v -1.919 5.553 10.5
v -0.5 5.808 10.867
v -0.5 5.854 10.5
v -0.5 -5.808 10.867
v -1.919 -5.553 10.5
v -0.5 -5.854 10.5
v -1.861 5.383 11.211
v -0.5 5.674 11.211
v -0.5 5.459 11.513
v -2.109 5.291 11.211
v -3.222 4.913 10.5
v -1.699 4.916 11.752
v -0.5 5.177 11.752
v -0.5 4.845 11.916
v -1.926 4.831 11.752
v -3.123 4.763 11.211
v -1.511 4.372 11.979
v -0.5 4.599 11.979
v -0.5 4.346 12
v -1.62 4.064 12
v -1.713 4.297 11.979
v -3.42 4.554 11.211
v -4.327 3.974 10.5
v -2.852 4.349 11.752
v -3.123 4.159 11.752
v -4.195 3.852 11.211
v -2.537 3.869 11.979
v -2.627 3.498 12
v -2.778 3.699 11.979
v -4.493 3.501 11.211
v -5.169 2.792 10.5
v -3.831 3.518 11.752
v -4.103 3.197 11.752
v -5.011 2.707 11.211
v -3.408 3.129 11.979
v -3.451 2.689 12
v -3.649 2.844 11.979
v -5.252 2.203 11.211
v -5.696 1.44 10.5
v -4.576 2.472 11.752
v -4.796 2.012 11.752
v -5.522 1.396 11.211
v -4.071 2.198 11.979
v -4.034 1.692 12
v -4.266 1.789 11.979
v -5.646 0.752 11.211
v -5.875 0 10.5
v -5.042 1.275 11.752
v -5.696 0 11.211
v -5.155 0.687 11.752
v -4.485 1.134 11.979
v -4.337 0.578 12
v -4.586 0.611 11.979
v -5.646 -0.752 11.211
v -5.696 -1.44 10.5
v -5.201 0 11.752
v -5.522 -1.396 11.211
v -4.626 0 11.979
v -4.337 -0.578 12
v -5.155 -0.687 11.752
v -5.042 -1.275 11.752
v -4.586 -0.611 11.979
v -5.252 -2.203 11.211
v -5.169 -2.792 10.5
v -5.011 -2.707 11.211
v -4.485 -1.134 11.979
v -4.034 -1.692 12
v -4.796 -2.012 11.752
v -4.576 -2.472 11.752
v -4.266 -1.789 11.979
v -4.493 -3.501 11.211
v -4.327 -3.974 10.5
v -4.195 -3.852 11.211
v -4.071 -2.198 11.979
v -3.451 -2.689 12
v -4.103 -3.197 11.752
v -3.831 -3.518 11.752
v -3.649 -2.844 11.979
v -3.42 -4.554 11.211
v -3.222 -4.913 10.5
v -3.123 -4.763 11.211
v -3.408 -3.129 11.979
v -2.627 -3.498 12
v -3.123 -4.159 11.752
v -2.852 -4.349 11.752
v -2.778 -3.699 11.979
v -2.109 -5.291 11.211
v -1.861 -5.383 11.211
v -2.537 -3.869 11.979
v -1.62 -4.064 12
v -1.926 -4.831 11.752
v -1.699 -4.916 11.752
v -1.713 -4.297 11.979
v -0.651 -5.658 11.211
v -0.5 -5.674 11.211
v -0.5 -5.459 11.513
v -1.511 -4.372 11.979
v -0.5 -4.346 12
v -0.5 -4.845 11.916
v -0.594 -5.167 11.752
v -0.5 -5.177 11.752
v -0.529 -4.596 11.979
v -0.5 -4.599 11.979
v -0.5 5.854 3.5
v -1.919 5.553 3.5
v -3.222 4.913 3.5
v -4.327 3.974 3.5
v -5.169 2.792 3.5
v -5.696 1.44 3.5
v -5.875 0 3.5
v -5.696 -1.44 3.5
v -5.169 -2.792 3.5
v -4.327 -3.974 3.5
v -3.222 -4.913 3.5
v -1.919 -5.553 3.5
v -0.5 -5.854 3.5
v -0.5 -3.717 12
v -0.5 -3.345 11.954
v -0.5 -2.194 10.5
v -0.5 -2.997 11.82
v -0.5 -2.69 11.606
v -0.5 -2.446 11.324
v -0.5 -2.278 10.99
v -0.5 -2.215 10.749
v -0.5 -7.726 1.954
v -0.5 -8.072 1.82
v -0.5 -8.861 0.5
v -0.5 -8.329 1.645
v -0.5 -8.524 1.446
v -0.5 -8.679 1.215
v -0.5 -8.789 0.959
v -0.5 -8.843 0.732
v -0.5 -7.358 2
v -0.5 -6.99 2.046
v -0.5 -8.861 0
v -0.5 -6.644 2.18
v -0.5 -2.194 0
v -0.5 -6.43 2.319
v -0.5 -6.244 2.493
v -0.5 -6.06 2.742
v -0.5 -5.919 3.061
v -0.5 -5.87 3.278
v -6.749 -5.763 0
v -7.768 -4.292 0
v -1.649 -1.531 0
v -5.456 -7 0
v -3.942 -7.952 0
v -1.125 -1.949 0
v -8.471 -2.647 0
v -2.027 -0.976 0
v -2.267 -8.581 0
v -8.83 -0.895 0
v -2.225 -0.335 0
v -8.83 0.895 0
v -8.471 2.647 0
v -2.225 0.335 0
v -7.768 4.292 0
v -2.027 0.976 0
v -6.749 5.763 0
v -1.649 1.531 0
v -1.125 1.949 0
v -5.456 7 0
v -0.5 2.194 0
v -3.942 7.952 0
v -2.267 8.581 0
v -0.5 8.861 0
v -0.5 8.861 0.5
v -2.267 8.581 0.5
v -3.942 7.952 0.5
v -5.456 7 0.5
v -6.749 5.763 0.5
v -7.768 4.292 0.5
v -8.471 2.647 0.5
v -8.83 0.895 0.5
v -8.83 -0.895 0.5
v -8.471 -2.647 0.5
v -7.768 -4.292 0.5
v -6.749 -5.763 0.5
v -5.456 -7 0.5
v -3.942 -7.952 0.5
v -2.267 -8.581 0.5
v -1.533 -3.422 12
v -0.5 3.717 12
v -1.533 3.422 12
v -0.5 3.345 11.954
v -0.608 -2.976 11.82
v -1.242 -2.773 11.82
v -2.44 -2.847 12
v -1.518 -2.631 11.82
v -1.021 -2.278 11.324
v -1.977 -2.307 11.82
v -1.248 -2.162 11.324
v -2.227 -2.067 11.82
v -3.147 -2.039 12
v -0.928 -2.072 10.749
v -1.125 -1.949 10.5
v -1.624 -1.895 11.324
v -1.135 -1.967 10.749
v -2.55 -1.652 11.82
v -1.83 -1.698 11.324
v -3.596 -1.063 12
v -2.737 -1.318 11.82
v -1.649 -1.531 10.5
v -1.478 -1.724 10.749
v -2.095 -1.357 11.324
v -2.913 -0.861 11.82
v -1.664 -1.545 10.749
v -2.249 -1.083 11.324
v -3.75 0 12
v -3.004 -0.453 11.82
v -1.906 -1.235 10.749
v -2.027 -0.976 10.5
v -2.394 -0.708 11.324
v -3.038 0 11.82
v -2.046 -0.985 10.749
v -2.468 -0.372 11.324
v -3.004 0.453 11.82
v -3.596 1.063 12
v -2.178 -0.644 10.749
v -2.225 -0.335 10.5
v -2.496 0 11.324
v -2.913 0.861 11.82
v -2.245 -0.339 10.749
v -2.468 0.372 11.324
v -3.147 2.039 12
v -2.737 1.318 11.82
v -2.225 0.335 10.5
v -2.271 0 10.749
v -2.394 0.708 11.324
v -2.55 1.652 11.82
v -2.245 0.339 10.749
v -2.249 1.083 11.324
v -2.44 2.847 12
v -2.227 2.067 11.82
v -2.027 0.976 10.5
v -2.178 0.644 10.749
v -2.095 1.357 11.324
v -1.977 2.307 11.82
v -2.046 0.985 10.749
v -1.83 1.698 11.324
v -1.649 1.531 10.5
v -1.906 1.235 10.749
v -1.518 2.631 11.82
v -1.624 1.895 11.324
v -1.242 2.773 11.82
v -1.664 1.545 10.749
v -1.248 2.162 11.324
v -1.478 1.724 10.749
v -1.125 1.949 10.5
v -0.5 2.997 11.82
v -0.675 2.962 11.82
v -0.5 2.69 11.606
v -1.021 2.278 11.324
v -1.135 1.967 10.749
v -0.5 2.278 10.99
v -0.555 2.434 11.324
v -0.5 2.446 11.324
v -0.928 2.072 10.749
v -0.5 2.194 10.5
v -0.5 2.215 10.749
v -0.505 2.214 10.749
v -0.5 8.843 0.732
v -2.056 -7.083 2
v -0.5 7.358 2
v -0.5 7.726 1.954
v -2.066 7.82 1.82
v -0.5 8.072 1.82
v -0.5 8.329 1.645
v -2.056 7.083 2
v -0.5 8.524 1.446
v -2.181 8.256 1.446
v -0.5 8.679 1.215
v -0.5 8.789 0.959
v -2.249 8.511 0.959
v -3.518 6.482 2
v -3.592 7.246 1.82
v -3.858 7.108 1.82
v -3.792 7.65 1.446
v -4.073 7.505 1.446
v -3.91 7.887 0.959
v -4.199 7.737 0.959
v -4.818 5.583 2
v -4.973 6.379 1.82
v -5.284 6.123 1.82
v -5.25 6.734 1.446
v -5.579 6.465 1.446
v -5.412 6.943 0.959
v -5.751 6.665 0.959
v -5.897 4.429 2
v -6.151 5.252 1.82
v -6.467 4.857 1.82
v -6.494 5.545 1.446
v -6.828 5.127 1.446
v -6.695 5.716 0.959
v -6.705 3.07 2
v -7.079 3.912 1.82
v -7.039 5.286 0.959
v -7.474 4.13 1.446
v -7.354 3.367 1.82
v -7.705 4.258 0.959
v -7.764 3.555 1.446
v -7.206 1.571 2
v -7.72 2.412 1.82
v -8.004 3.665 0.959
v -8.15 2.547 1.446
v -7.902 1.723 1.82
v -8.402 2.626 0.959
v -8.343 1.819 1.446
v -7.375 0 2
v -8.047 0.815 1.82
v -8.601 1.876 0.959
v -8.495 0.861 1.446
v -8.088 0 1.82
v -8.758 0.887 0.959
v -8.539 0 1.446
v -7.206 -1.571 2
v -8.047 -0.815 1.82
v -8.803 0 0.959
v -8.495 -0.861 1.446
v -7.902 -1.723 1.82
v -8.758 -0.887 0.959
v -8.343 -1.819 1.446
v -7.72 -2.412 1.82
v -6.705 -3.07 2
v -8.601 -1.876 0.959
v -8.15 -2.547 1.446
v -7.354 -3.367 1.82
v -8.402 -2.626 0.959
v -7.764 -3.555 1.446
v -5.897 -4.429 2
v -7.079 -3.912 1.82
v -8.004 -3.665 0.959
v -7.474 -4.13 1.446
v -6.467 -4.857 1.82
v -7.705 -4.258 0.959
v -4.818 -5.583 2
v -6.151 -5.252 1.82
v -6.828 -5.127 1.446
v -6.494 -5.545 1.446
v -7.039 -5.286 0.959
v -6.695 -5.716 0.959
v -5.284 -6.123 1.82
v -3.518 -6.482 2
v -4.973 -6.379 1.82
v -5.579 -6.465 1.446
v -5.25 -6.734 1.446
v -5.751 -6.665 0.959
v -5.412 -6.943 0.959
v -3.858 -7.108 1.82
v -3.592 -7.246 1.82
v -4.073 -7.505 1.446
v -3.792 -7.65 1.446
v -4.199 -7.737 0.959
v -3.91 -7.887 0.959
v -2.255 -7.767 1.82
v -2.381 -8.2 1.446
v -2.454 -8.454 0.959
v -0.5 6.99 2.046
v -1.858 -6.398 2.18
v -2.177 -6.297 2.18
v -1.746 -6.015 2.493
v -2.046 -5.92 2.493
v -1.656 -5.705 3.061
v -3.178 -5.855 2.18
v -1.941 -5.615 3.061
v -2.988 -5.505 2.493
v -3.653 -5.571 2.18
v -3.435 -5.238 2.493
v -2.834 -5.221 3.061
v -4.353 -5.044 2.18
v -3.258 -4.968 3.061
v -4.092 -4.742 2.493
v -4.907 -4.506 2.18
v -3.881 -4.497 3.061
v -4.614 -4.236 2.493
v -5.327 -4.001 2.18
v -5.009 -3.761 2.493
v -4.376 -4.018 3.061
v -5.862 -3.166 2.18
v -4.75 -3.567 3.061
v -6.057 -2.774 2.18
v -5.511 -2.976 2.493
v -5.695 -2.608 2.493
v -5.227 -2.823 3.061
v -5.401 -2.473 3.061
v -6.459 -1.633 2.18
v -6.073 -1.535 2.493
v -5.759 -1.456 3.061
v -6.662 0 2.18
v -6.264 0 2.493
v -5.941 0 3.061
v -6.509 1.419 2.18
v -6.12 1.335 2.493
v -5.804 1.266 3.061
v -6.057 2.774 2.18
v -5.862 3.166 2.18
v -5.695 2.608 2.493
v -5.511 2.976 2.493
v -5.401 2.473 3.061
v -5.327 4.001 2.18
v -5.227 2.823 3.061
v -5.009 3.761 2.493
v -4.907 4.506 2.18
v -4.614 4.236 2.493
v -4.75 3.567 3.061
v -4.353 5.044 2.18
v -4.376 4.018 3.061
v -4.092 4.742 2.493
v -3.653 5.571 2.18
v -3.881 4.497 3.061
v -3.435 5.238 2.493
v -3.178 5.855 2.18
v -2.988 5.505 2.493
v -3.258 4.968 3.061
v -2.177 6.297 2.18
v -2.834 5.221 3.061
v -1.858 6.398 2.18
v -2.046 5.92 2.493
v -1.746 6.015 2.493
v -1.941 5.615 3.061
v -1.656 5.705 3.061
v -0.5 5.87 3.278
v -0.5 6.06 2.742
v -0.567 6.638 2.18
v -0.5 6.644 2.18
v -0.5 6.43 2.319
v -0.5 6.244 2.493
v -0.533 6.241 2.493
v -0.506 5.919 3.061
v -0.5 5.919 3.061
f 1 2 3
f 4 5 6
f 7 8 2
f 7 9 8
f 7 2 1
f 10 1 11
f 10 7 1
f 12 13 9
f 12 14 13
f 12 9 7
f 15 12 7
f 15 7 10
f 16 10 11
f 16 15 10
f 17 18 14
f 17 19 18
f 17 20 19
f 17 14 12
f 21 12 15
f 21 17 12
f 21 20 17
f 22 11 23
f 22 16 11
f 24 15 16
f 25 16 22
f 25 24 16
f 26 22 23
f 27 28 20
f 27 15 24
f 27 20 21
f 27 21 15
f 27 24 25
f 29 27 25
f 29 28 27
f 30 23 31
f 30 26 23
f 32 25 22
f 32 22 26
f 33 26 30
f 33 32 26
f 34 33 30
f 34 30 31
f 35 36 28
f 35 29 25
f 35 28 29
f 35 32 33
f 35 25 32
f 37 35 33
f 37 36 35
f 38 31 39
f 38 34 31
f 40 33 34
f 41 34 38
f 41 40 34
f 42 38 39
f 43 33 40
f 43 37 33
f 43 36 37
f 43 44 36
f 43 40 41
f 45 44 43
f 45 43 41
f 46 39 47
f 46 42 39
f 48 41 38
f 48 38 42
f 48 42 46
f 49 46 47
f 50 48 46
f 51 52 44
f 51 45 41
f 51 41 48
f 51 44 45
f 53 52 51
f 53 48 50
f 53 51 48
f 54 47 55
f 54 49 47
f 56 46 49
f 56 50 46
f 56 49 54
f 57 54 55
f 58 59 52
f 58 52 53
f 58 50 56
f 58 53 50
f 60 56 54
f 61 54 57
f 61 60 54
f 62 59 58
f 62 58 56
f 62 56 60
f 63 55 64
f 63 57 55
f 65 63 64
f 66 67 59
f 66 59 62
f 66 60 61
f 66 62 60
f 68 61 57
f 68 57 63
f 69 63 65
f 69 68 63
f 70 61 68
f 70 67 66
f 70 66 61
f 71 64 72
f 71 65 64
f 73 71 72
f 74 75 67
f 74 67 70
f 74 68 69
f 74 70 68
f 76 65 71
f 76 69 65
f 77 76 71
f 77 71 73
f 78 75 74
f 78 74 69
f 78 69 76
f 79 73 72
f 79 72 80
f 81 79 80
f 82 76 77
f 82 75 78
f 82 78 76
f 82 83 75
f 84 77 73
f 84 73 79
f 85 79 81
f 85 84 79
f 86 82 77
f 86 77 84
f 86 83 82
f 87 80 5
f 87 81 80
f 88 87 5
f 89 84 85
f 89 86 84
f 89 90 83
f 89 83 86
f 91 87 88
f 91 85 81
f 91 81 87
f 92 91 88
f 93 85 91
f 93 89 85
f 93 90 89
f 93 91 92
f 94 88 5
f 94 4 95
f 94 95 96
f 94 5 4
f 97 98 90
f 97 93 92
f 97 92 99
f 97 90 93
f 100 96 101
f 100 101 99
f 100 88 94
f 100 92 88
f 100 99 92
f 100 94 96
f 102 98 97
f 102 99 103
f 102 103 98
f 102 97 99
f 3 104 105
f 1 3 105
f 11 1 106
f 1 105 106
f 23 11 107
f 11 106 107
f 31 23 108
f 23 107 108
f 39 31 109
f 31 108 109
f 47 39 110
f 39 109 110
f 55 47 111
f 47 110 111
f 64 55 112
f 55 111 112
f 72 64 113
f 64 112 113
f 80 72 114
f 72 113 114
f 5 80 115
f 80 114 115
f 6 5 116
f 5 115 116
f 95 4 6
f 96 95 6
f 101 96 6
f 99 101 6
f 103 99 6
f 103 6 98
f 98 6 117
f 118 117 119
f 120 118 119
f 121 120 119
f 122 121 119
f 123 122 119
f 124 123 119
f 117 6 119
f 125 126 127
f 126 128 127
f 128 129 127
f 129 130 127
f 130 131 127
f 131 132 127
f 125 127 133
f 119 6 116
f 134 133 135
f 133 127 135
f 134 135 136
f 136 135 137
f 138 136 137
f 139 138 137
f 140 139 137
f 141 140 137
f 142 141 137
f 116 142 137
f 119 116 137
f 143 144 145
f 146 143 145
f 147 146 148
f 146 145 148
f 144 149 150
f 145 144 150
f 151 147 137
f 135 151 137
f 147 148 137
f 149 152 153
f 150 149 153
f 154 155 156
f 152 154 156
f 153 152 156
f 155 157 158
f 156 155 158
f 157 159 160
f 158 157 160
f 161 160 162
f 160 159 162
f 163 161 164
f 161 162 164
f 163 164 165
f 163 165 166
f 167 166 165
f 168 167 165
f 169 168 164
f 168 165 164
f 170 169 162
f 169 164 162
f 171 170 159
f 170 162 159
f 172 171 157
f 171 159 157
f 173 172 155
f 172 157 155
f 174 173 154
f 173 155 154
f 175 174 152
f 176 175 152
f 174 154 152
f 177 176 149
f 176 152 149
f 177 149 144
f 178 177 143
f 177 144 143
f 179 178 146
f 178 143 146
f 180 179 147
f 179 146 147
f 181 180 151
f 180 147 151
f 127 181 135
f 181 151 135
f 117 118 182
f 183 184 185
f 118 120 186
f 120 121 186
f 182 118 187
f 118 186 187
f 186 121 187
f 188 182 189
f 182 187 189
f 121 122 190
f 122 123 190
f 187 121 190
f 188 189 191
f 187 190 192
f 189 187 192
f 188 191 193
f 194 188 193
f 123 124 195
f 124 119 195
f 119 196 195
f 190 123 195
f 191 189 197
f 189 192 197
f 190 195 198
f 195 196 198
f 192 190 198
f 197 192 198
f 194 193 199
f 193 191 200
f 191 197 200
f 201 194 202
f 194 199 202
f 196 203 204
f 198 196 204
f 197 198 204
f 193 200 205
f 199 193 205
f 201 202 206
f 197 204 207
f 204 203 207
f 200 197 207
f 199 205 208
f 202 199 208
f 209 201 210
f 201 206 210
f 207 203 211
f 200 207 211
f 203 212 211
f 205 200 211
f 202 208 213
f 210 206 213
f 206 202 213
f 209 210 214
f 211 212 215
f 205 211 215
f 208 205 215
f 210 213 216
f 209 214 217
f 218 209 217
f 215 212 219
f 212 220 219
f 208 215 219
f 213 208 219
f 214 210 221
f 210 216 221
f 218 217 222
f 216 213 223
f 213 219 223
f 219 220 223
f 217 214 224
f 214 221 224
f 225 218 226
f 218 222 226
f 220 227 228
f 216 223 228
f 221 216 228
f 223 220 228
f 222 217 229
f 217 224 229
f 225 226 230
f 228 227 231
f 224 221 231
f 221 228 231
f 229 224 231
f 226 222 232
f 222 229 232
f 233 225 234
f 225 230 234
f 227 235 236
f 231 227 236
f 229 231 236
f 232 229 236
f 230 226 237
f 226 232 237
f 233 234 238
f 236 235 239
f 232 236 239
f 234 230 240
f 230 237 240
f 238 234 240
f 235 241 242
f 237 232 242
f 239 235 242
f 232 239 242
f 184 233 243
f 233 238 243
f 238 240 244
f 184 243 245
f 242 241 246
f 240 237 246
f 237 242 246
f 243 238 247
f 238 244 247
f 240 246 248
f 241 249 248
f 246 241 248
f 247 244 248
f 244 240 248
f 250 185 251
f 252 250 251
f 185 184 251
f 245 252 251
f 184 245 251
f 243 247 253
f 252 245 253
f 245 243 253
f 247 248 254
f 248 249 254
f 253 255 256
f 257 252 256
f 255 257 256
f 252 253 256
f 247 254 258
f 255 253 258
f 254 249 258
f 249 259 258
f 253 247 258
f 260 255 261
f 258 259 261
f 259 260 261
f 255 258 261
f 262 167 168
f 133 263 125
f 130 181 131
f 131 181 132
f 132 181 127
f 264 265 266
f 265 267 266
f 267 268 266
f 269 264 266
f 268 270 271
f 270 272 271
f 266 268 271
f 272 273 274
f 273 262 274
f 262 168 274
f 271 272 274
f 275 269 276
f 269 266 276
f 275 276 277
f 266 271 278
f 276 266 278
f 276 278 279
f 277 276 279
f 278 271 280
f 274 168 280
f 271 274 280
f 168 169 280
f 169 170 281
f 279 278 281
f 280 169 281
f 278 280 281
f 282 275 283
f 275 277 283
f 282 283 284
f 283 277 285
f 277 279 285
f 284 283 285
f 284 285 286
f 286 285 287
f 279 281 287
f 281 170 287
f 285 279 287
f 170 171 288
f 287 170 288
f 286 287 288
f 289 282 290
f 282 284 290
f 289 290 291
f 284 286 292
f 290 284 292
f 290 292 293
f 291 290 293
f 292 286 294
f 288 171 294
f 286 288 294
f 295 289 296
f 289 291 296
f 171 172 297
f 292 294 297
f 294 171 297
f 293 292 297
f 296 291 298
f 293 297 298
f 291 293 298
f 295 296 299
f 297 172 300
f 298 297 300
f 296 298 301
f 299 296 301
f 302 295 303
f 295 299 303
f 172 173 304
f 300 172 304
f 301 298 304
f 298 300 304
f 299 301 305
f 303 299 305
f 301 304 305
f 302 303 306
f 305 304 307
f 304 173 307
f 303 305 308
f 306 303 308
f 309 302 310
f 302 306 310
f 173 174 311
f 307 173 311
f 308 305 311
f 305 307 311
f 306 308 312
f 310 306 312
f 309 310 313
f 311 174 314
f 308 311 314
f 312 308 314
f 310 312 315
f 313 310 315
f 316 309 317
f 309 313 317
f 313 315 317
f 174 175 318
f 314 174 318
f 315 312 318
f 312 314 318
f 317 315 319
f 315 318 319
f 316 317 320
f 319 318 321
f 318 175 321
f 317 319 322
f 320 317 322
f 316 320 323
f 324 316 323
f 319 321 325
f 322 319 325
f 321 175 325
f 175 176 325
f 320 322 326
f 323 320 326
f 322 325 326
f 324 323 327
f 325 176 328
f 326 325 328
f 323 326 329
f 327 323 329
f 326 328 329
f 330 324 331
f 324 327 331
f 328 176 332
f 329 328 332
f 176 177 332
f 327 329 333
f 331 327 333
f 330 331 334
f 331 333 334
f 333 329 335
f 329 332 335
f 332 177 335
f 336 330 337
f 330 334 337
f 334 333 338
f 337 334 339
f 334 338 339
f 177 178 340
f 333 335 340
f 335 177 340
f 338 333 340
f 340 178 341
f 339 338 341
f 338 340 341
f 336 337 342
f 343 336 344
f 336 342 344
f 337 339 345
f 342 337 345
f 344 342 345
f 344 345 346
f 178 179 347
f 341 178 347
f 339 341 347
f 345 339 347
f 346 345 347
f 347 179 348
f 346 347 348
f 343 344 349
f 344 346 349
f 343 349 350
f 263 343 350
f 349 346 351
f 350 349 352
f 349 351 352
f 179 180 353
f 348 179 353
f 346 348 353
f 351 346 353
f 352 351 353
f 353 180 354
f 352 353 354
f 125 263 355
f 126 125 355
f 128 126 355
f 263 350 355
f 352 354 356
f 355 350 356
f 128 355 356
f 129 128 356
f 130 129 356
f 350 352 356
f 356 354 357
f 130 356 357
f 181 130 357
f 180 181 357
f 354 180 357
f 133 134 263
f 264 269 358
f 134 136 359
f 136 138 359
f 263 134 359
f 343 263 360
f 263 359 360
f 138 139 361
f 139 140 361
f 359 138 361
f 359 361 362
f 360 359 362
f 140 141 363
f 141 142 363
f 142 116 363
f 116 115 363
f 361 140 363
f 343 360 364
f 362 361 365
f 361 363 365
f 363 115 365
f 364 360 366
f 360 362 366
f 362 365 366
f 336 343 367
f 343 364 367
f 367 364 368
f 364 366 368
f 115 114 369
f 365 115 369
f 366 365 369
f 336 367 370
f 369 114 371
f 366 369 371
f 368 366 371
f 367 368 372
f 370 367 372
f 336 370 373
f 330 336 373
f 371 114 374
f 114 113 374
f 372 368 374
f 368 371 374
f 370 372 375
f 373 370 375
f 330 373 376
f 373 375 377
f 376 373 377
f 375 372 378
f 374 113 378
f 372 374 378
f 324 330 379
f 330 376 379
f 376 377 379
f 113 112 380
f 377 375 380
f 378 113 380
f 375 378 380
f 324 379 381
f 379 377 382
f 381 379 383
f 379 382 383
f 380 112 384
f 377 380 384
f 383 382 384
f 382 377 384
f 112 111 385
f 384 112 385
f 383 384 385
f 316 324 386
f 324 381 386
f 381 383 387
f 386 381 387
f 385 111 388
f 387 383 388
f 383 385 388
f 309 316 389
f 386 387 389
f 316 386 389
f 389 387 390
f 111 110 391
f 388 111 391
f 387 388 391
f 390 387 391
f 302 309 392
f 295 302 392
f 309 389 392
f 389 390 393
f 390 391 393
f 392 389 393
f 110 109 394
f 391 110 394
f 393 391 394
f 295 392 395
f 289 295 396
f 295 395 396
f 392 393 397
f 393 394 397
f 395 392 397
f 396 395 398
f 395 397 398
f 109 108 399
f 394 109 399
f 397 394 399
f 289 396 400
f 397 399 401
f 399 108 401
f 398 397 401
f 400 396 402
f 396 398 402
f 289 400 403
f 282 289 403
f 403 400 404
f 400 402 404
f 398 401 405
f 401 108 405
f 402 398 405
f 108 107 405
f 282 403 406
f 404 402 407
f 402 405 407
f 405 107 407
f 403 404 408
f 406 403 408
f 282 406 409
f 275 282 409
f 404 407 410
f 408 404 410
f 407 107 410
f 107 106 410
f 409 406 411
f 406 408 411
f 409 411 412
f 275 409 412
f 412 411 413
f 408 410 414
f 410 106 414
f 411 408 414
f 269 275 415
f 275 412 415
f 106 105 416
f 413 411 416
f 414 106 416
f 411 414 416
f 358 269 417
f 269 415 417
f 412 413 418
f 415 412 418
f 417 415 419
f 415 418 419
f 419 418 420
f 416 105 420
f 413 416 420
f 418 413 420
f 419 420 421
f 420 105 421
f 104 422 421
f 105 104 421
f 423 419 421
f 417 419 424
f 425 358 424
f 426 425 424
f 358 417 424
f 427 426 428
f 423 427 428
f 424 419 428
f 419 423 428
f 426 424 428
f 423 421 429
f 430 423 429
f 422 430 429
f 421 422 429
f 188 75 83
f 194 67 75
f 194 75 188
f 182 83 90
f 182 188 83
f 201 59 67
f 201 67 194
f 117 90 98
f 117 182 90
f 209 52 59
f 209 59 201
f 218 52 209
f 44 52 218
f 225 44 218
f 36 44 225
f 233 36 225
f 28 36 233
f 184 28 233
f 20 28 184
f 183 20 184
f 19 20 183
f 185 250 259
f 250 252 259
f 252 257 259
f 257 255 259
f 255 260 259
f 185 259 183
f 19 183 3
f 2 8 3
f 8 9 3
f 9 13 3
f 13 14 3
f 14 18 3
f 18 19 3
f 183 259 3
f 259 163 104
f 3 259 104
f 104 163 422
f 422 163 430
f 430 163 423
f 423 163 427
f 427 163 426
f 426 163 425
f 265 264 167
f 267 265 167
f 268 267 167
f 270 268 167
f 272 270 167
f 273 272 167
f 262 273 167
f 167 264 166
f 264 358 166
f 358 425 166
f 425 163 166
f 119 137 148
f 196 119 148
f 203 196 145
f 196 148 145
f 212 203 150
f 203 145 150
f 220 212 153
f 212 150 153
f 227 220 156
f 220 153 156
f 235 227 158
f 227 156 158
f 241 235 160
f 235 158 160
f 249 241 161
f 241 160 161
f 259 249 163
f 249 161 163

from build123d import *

# Parameters (mm, degrees)
F1_DEPTH = 12
F2_DEPTH = 2
F3_R     = 1.49999


# Not quite as in the source:
# - a fillet or chamfer is up to 0.001 mm smaller than in the source, because OpenCascade refuses the exact size


with BuildPart() as f1:
    # F0 (on Top) → F1 (new body)
    with BuildSketch(Plane.XY):
        with BuildLine():
            ThreePointArc((-0.5, -2.1937410968), (-2.25, 0), (-0.5, 2.1937410968))
            Line((-0.5, 2.1937410968), (-0.5, 5.853684737))
            ThreePointArc((-0.5, 5.853684737), (-5.875, 0), (-0.5, -5.853684737))
            Line((-0.5, -5.853684737), (-0.5, -2.1937410968))
        make_face()
    extrude(amount=F1_DEPTH)

    # F0 (on Top) → F2 (join)
    with BuildSketch(Plane.XY):
        with BuildLine():
            ThreePointArc((-0.5, -5.853684737), (-5.875, 0), (-0.5, 5.853684737))
            Line((-0.5, 5.853684737), (-0.5, 8.8609042992))
            ThreePointArc((-0.5, 8.8609042992), (-8.875, 0), (-0.5, -8.8609042992))
            Line((-0.5, -8.8609042992), (-0.5, -5.853684737))
        make_face()
    extrude(amount=F2_DEPTH)

    # F3 (radius 1.5 in the source; OpenCascade refuses exactly that, so slightly less here)
    f3_edges = [f1.edges().sort_by_distance(p)[0] for p in [
        (-5.875, 0, 2),
        (-8.875, 0, 2),
        (-5.875, 0, 12),
        (-2.25, 0, 12),
    ]]
    fillet(f3_edges, radius=F3_R)


solid = f1.part
